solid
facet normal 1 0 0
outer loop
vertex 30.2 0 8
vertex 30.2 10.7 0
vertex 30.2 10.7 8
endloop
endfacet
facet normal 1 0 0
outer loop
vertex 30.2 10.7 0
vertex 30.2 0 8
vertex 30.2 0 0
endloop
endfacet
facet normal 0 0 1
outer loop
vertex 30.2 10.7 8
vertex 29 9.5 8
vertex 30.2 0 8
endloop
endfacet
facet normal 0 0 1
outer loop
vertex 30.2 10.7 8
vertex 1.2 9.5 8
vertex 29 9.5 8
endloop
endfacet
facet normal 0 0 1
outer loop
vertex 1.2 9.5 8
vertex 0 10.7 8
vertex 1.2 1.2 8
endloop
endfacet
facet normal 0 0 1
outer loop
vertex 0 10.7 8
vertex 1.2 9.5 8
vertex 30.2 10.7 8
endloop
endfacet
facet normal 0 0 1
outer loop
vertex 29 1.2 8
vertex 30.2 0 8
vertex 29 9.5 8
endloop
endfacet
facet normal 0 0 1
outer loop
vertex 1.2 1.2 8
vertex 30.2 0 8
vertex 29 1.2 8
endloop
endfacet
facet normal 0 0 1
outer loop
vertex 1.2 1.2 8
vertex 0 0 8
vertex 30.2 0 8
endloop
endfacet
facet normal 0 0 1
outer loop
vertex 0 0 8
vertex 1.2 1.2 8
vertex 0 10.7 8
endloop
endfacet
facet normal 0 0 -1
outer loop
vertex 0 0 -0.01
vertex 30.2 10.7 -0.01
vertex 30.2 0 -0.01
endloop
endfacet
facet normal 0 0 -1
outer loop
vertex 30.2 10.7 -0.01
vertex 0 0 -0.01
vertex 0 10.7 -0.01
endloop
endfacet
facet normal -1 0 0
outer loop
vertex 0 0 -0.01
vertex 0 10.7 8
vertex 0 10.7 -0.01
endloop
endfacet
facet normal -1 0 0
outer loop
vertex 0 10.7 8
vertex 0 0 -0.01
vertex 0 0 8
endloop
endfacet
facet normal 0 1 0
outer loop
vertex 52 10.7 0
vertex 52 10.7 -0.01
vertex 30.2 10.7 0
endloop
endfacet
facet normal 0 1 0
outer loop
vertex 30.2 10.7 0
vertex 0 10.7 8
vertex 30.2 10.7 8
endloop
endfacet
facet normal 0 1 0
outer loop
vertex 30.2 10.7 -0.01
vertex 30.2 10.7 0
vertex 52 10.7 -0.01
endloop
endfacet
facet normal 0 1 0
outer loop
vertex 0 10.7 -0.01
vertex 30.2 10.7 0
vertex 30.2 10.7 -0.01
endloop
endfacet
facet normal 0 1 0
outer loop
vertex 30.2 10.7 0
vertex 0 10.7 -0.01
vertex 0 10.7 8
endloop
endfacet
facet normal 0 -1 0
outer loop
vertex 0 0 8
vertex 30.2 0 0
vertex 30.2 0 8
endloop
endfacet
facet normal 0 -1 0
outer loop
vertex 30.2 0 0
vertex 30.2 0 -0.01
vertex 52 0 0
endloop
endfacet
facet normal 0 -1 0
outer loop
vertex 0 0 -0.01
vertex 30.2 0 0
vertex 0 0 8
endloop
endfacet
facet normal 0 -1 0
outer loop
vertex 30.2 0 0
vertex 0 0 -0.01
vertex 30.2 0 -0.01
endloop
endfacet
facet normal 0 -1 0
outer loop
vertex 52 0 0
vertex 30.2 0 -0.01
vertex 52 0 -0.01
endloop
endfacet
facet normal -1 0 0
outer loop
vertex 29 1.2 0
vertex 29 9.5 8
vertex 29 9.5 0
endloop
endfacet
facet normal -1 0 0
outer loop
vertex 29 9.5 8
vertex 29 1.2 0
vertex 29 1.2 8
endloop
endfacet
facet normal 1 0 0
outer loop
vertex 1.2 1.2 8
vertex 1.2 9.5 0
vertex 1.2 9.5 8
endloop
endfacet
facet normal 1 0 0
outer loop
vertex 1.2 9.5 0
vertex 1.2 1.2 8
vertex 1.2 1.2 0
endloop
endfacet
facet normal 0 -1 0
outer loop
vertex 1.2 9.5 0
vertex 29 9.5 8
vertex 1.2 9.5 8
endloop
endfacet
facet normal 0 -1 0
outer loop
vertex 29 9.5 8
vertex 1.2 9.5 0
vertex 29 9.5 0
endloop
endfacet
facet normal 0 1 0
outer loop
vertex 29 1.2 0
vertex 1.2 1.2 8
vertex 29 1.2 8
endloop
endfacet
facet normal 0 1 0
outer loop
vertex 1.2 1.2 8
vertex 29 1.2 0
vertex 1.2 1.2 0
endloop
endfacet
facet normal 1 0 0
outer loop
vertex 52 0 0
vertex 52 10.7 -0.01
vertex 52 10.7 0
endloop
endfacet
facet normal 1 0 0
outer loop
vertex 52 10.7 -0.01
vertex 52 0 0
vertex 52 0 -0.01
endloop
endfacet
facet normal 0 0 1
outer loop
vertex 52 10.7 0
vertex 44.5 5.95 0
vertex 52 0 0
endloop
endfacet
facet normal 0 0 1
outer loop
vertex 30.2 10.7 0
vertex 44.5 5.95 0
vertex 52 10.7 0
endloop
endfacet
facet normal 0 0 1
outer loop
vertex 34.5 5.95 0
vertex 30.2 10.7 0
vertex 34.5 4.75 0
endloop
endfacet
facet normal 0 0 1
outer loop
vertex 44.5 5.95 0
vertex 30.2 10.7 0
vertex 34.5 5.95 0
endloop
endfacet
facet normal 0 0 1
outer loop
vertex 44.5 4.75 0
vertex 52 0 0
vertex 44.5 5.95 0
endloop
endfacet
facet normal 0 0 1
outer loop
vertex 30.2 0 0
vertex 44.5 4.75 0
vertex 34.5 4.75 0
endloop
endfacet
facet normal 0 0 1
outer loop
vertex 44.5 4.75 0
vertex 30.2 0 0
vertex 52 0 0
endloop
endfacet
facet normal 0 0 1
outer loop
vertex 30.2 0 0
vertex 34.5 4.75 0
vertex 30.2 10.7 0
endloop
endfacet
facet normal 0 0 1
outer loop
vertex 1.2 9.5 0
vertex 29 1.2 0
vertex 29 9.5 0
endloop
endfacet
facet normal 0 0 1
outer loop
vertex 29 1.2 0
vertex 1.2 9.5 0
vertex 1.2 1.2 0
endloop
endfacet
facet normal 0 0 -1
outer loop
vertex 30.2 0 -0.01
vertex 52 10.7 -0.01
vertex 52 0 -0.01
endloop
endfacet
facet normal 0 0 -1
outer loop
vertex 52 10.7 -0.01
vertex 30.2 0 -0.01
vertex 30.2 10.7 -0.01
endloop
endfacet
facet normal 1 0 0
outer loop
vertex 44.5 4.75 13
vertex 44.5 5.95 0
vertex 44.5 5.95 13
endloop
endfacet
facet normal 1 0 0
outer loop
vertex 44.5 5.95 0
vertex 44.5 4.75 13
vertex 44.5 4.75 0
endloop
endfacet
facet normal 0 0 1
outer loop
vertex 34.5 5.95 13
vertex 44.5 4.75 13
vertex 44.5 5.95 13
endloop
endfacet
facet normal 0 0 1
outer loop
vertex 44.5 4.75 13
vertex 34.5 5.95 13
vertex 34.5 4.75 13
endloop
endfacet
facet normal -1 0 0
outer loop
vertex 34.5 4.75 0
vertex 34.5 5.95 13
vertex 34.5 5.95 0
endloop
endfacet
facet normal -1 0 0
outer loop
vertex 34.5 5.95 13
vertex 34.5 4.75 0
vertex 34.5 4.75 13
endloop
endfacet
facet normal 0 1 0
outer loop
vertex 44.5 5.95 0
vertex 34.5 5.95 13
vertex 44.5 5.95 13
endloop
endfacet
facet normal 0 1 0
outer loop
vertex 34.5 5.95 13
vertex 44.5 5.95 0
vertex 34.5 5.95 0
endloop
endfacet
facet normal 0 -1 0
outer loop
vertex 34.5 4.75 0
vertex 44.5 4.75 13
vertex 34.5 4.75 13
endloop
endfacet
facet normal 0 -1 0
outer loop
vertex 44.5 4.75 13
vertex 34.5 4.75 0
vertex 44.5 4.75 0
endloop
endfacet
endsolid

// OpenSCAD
// file: ../Base/Boxes.scad
// Fischertechnik Box Foundation
// Pre-designed Boxes

use <Constants.scad>

include <PlacementOptions.scad>

box190Width = 190;
box190Depth = 130;
box130Width = 130;
box130Depth = 95;
boxUsageHeight = 33.9;
boxWallThickness = 2.4;
boxBaseThickness = 1.0;
boxWebWidth = 3.0;

// getBoxWallThickness()
// Gets the wall thickness of a Fischertechnik Box

function getBoxWallThickness() = boxWallThickness;

// Gets the usable height of a fischertechnik box
function getBoxUsageHeight() = boxUsageHeight;

// Gets the thickness of the Fischertechnik box base.
function getBoxBaseThickness() = boxBaseThickness;

// Gets the width of a box web
function getBoxWebWidth() = boxWebWidth;

// Gets the usable inner space of a Box 190 as an x/y-list
function getBox190Space() = [
    box190Width - 2*getBoxWallThickness(), 
    box190Depth - 2*getBoxWallThickness() ];

// Imports the Fischertechnik empty box 130x190 mm and places it at position 0,0
// 190x130 are the outer sizes, the inner space is slightly smaller. Use getBox190Space() to get the inner sizes.
// This module needs the STL file "Fischertechnik Box 130x190.stl" in the library path.
// The box is positioned that the usable inner space is at the 0,0,0 position. The

module Box190() {
    translate([-getBoxWallThickness(),-getBoxWallThickness(),-getBoxBaseThickness()])
        import("Fischertechnik Box 130x190.stl", convexity=3);
}

// Gets the usable inner space of a Box 130 as an x/y-list
function getBox130Space() = [
    box130Width - 2*getBoxWallThickness(), 
    box130Depth - 2*getBoxWallThickness() ];

// Imports the Fischertechnik empty box 95x130 mm and places it at position 0,0
// 190x130 are the outer sizes, the inner space is slightly smaller. Use getBox190Space() to get the inner sizes.
// This module needs the STL file "Fischertechnik Box 95x130.stl" in the library path.
// The box is positioned that the usable inner space is at the 0,0,0 position. The

module Box130() {
    translate([-getBoxWallThickness(),-getBoxWallThickness(),-getBoxBaseThickness()])
        import("Fischertechnik Box 95x130.stl", convexity=3);
}

// Creates a web at the specified box walls
// corner 0 = LowerLeft, 1 = UpperLeft, 2 = UpperRight, 3 = LowerRight
// side 0 = LeftOfCorner, 1 = RightOfCorner
// distance = Distance in mm from the corner
// box = inner width and depth of the box (default: Box 190)
// webWidth = length of the web (default is 3 mms)
// webThickness = thickness of the web (default is 1 mm)

module BoxWeb(corner, side, distance, box=getBox190Space(), webWidth=getBoxWebWidth(), webThickness=1.0) {
    sink = getBoxWallThickness()/2;

    width = (corner % 2 == 0) ? 
            (side == LeftOfCorner ? webWidth : webThickness) :
            (side == LeftOfCorner ? webThickness : webWidth);

    depth = (corner % 2 == 0) ? 
            (side == RightOfCorner ? webWidth : webThickness) :
            (side == RightOfCorner ? webThickness : webWidth);
    
    xDiff = corner == LowerLeft ? 
                (side == LeftOfCorner ? -sink : distance) :
            (corner == UpperLeft ?                
                (side == LeftOfCorner ? distance : -sink) :
            (corner == UpperRight ?
                (side == LeftOfCorner ? box.x-webWidth+sink : box.x-distance-webThickness) :
                (side == LeftOfCorner ? box.x-distance-webThickness: box.x-webWidth+sink)));

    yDiff = corner == LowerLeft ? 
                (side == RightOfCorner ? -sink : distance) :
            (corner == UpperLeft ?
                (side == RightOfCorner ? box.y-distance : box.y-webWidth+sink) :
            (corner == UpperRight ?
                (side == RightOfCorner ? box.y-webWidth+sink : box.y-distance) :
                (side == RightOfCorner ? distance : -sink)));
    
    translate([xDiff, yDiff, -getExcess()])
        cube([width, depth, boxUsageHeight + 2*getExcess()]);
}
// file: ../Base/Rotation.scad
// Fischertechnik Box Foundation
// Geometry Helpers Rotation

include <PlacementOptions.scad>

// getRotatedSpace(space, rotation=NoRotation)
// Rotates the space dependent on the specified rotation

function getRotatedSpace(space, rotation=NoRotation) = [
    (rotation == Rotate90 || rotation == Rotate270) ? space.y : space.x,
    (rotation == Rotate90 || rotation == Rotate270) ? space.x : space.y
];

// Rotates the given space around the fixed left lower corner
// space = the space the children needs as width/depth list [width,depth]
// rotation = 0 Rotate0 degrees, 1 Rotate90 degrees, 2 Rotate180 degrees, 3 Rotate270 degrees (equivalent to -90)

module RotateFix(space, rotation=NoRotation) {
    dy = (rotation == Rotate0 || rotation == Rotate270) ? 0 :
        (rotation == Rotate90) ? space.x :
        space.y;
    dx = (rotation < Rotate180) ? 0 :
        (rotation == Rotate180) ? space.x :
        space.y;
    
    translate([dx, dy, 0])
        rotate([0, 0, rotations[rotation]])
            children();
}
// file: ../Base/Alignment.scad
// Fischertechnik Box Foundation
// Geometry Helpers Alignment

include <PlacementOptions.scad>

// getAlignedX(elementWidth, spaceWidth, align=AlignRight, offset=0)
// Gets the aligned X offset of an element with the given
// width in the given space.
// elementWidth = The width of the element to positon
// spaceWidth = The space where the element should be aligned
// align = 0 AlignLeft, 1 AlignCenter, 2 AlignRight
// offset = an optional offset from the aligned position. When
// aligned left or centered, then positive values are in X direction.
// When aligned right then positive values are in negative X direction.

function getAlignedX(elementWidth, spaceWidth, align=AlignRight, offset=0) =
    (align == AlignLeft) ?
        offset :
        ((align == AlignCenter) ?
        (spaceWidth - elementWidth)/2 + offset :
        spaceWidth - offset - elementWidth);

// getAlignedY(elementDepth, spaceDepth, align=AlignTop, offset=0)
// Gets the aligned Y offset of an element with the given
// depth in the given space.
// elementDepth = The depth of the element to positon
// spaceDepth = The space where the element should be aligned
// align = 0 AlignBottom, 1 AlignCenter, 2 AlignTop
// offset = an optional offset from the aligned position. When
// aligned bottom or centered, then positive values are in Y direction.
// When aligned top then positive values are in negative Y direction.

function getAlignedY(elementDepth, spaceDepth, align=AlignTop, offset=0) =
    (align == AlignBottom) ?
        offset :
        ((align == AlignCenter) ?
        (spaceDepth - elementDepth)/2 + offset :
        spaceDepth - offset - elementDepth);
// file: ../Base/PlacementOptions.scad
// Fischertechnik Box Foundation
// Placement Options

// Alignment
NoAlign = 0;
AlignLeft = 1;
AlignBottom = 2;
AlignCenter = 3;
AlignRight = 4;
AlignTop = 5;

// Element rotation degree steps
rotations = [0, -90, -180, -270];

// Rotation
NoRotation = 0;
Rotate0 = 0;
Rotate90 = 1;
Rotate180 = 2;
Rotate270 = 3;

// Docking (seen from above)
NoDock = -1;
DockLeft = 0;
DockTop = 1;
DockRight = 2;
DockCorner = 2;
DockBottom = 3;

// Web corners
LowerLeft = 0;
UpperLeft = 1;
UpperRight = 2;
LowerRight = 3;

// Web position relative to corner
LeftOfCorner = 0;
RightOfCorner = 1;
// file: ../Base/Placement.scad
// Fischertechnik Box Foundation
// Geometry Helpers Placement

use <Constants.scad>
use <Alignment.scad>
use <Rotation.scad>
use <Boxes.scad>

include <PlacementOptions.scad>

// Place(x=0, y=0, elementSpace=[0,0], alignX=AlignLeft, alignY=AlignBottom, rotation=Rotate0, boxSpace=getBox190Space())
// Places the child at the specified position
// y = Y-Position. This is a relative position when an X aligment is specified.
// x = X-Position. This is a relative position when an Y aligment is specified.
// elementSpace = space of the element to be placed [x,y]
// alignX = -1=NoAlign, 0 AlignLeft, 1 AlignCenter, 3 AlignRight (elementSpace and boxSpace required!)
// alignY = -1=NoAlign, 2 AlignBottom, 1 AlignCenter, 4 AlignTop (elementSpace and boxSpace required!)
// rotation = 0 Rotate0 0 degrees, 1 Rotate90 90 degrees, 
// 2 Rotate180 180 degrees, 3 Rotate270 270 degrees (equivalent to -90)
// boxSpace = Inner space of the box where the placement occurs [x,y] - default is Box 190x130 inner space

module Place(x=0, y=0, elementSpace=[0,0], 
  alignX=AlignLeft, alignY=AlignBottom, 
  rotation=NoRotation, boxSpace=getBox190Space()) {

    module Position(x, y, space, rotation=Rotate0) {
        translate([x, y, 0])
            RotateFix(space, rotation)
                children();
    }

    space = getRotatedSpace(elementSpace, rotation);
    alignedX = getAlignedX(space.x, boxSpace.x, alignX, x);
    alignedY = getAlignedY(space.y, boxSpace.y, alignY, y);
    Position(alignedX, alignedY, elementSpace, rotation)
        children();
}

// Center(space=getBox130Space(), elementSpace=[0,0])
// space = Space where the children is centered. For cylinder use centered=true and no elementSpace.
// elementSpace = space of the element to be centered [x,y]

module Center(space=getBox190Space(), elementSpace=[0,0]) {
    translate([(space.x - elementSpace.x) / 2, (space.y - elementSpace.y) / 2])
        children(0);
}

// CenterHorizontal(width=0, y=0, offset=0, space=getBox130Space())
// space = Space where the children is centered. For cylinder use centered=true and no elementSpace.
// elementSpace = space of the element to be centered [x,y]

module CenterHorizontal(width=0, y=0, offset=0, space=getBox190Space()) {
    translate([(space.x - width) / 2 + offset, y])
        children(0);
}

// CenterVertical(depth=0, x=0, offset=0, space=getBox130Space())
// space = Space where the children is centered. For cylinder use centered=true and no elementSpace.
// elementSpace = space of the element to be centered [x,y]

module CenterVertical(depth=0, x=0, offset=0, space=getBox190Space()) {
    translate([x, (space.y - depth) / 2 + offset])
        children(0);
}
// file: ../Base/Constants.scad
// Fischertechnik Box Foundation
// Constants

// Constant values necessary for multiple elements

// Base constants
dividerThickness = 1.2;
excess = 0.01;
fragments = 90;
tolerance = 0.8;

// Gets the thickness of a divider 
function getDividerThickness() = dividerThickness;

// Gets the excess that is used to merge walls into each other
function getExcess() = excess;

// Gets amount of fragments of a cylinder
function getFragments() = fragments;

// Gets the inner tolerance of a frame to each side
function getTolerance() = tolerance;


// Fischertechnik specific constants
axisDiameter = 4;
axisBottomDiameter = axisDiameter + 1;
axisTolerance = 0.2;
axisLockingLength = 8;

// Gets axis diameter of Fischertechnik axis
function getAxisDiameter() = axisDiameter;

// Gets axis diameter tolerance (subtracted for element axis)
function getAxisTolerance() = axisTolerance;

// Gets the axis diameter for standing axis
function getStandAxisDiameter() = getAxisDiameter() - getAxisTolerance();

// Gets axis bottom diameter for thicker part at the bottom
function getAxisBottomDiameter() = axisBottomDiameter;

// Gets the lengthh of the locking part of a locking axis
function getAxisLockingLength() = axisLockingLength;

// Studs

studHeight = 2.5;
studTolerance = 0.2;
studRailDistance = 9;   // as in ft 50

// gets the height of a connecting stud
function getStudHeight() = studHeight;

// gets the connecting stud height tolerance
function getStudTolerance() = studTolerance;

// gets the default rail distance for studs
function getStudRailDistance() = studRailDistance;

// Dockable Frame with Edge

standardEdgeDistance = 2.5;
standardWebDistance = 11.5;
standardCornerLength = 15;

// gets the standard distance to the wall of the box for dockable frames with webs
function getStandardEdgeDistance() = standardEdgeDistance;

// gets the standard distance of each web to the corner of the dockable frame
function getStandardWebDistance() = standardWebDistance;

// gets the standard length of the corner walls of a dockable frame
function getStandardCornerLength() = standardCornerLength;

// Tubes

tubeWallFactor = 0.8;

// gets the wall thickness of a tube.
function getTubeWallThickness() = tubeWallFactor * getDividerThickness();

// Small Parts and Divider Frame

smallPartsFrameHeight = 20;

// gets the frame height for docked small parts boxes.
function getSmallPartsFrameHeight() = smallPartsFrameHeight;

// Hubs

hubRingDiameter = 19.5;
hubRingLevelDiameter = 21;

// gets the diameter of a tube matching the inner ring of a wheel
function getHubRingDiameter() = hubRingDiameter;

// gets the diameter of a hub tube with a thicker diameter
function getHubRingLevelDiameter() = hubRingLevelDiameter;

// Struts

strutAddLength = 9.0;
strutDepth = 8.0;
strutThickness = 2.8;
strutOuterTolerance = 0.6;

// gets the full length of a strut (nominal length plus 2x radius at the ends)
function getFullStrutLength(length) = length + strutAddLength;

// gets the radius of the end of a strut
function getStrutEndRadius() = strutAddLength / 2;

// gets the the depth (width) of a strut
function getStrutDepth() = strutDepth;

// gets the the thickness of a strut
function getStrutThickness() = strutThickness;

// gets the tolerance added to the strut sizes for strut holders
function getStrutOuterTolerance() = strutOuterTolerance;

// Propeller

propellerAxisDiameter = 7.0;
propellerAxisTolerance = 0.2;

// gets the propeller axis outer diameter
function getPropellerAxisDiameter() = propellerAxisDiameter;

// gets the propeller axis printing tolerance
function getPropellerAxisTolerance() = propellerAxisTolerance;
// main file
// Fischertechnik Box Library
// Frame  for bracket without worm
// 31046

use <../Base/Constants.scad>
use <../ModelBase/Complex.scad>

// getFrameBracketWithoutWormSpace()
// Gets the space for a frame for a bracket with worm.

function getFrameBracketWithoutWormSpace() = getFrameBracketSpace();

// FrameBracketWithoutWorm()
// Frame for bracket with worm.

module FrameBracketWithoutWorm() {
    FrameBracket([ 10, getDividerThickness(), 13 ]);
}

// Test
color("lightgray")
FrameBracketWithoutWorm();
